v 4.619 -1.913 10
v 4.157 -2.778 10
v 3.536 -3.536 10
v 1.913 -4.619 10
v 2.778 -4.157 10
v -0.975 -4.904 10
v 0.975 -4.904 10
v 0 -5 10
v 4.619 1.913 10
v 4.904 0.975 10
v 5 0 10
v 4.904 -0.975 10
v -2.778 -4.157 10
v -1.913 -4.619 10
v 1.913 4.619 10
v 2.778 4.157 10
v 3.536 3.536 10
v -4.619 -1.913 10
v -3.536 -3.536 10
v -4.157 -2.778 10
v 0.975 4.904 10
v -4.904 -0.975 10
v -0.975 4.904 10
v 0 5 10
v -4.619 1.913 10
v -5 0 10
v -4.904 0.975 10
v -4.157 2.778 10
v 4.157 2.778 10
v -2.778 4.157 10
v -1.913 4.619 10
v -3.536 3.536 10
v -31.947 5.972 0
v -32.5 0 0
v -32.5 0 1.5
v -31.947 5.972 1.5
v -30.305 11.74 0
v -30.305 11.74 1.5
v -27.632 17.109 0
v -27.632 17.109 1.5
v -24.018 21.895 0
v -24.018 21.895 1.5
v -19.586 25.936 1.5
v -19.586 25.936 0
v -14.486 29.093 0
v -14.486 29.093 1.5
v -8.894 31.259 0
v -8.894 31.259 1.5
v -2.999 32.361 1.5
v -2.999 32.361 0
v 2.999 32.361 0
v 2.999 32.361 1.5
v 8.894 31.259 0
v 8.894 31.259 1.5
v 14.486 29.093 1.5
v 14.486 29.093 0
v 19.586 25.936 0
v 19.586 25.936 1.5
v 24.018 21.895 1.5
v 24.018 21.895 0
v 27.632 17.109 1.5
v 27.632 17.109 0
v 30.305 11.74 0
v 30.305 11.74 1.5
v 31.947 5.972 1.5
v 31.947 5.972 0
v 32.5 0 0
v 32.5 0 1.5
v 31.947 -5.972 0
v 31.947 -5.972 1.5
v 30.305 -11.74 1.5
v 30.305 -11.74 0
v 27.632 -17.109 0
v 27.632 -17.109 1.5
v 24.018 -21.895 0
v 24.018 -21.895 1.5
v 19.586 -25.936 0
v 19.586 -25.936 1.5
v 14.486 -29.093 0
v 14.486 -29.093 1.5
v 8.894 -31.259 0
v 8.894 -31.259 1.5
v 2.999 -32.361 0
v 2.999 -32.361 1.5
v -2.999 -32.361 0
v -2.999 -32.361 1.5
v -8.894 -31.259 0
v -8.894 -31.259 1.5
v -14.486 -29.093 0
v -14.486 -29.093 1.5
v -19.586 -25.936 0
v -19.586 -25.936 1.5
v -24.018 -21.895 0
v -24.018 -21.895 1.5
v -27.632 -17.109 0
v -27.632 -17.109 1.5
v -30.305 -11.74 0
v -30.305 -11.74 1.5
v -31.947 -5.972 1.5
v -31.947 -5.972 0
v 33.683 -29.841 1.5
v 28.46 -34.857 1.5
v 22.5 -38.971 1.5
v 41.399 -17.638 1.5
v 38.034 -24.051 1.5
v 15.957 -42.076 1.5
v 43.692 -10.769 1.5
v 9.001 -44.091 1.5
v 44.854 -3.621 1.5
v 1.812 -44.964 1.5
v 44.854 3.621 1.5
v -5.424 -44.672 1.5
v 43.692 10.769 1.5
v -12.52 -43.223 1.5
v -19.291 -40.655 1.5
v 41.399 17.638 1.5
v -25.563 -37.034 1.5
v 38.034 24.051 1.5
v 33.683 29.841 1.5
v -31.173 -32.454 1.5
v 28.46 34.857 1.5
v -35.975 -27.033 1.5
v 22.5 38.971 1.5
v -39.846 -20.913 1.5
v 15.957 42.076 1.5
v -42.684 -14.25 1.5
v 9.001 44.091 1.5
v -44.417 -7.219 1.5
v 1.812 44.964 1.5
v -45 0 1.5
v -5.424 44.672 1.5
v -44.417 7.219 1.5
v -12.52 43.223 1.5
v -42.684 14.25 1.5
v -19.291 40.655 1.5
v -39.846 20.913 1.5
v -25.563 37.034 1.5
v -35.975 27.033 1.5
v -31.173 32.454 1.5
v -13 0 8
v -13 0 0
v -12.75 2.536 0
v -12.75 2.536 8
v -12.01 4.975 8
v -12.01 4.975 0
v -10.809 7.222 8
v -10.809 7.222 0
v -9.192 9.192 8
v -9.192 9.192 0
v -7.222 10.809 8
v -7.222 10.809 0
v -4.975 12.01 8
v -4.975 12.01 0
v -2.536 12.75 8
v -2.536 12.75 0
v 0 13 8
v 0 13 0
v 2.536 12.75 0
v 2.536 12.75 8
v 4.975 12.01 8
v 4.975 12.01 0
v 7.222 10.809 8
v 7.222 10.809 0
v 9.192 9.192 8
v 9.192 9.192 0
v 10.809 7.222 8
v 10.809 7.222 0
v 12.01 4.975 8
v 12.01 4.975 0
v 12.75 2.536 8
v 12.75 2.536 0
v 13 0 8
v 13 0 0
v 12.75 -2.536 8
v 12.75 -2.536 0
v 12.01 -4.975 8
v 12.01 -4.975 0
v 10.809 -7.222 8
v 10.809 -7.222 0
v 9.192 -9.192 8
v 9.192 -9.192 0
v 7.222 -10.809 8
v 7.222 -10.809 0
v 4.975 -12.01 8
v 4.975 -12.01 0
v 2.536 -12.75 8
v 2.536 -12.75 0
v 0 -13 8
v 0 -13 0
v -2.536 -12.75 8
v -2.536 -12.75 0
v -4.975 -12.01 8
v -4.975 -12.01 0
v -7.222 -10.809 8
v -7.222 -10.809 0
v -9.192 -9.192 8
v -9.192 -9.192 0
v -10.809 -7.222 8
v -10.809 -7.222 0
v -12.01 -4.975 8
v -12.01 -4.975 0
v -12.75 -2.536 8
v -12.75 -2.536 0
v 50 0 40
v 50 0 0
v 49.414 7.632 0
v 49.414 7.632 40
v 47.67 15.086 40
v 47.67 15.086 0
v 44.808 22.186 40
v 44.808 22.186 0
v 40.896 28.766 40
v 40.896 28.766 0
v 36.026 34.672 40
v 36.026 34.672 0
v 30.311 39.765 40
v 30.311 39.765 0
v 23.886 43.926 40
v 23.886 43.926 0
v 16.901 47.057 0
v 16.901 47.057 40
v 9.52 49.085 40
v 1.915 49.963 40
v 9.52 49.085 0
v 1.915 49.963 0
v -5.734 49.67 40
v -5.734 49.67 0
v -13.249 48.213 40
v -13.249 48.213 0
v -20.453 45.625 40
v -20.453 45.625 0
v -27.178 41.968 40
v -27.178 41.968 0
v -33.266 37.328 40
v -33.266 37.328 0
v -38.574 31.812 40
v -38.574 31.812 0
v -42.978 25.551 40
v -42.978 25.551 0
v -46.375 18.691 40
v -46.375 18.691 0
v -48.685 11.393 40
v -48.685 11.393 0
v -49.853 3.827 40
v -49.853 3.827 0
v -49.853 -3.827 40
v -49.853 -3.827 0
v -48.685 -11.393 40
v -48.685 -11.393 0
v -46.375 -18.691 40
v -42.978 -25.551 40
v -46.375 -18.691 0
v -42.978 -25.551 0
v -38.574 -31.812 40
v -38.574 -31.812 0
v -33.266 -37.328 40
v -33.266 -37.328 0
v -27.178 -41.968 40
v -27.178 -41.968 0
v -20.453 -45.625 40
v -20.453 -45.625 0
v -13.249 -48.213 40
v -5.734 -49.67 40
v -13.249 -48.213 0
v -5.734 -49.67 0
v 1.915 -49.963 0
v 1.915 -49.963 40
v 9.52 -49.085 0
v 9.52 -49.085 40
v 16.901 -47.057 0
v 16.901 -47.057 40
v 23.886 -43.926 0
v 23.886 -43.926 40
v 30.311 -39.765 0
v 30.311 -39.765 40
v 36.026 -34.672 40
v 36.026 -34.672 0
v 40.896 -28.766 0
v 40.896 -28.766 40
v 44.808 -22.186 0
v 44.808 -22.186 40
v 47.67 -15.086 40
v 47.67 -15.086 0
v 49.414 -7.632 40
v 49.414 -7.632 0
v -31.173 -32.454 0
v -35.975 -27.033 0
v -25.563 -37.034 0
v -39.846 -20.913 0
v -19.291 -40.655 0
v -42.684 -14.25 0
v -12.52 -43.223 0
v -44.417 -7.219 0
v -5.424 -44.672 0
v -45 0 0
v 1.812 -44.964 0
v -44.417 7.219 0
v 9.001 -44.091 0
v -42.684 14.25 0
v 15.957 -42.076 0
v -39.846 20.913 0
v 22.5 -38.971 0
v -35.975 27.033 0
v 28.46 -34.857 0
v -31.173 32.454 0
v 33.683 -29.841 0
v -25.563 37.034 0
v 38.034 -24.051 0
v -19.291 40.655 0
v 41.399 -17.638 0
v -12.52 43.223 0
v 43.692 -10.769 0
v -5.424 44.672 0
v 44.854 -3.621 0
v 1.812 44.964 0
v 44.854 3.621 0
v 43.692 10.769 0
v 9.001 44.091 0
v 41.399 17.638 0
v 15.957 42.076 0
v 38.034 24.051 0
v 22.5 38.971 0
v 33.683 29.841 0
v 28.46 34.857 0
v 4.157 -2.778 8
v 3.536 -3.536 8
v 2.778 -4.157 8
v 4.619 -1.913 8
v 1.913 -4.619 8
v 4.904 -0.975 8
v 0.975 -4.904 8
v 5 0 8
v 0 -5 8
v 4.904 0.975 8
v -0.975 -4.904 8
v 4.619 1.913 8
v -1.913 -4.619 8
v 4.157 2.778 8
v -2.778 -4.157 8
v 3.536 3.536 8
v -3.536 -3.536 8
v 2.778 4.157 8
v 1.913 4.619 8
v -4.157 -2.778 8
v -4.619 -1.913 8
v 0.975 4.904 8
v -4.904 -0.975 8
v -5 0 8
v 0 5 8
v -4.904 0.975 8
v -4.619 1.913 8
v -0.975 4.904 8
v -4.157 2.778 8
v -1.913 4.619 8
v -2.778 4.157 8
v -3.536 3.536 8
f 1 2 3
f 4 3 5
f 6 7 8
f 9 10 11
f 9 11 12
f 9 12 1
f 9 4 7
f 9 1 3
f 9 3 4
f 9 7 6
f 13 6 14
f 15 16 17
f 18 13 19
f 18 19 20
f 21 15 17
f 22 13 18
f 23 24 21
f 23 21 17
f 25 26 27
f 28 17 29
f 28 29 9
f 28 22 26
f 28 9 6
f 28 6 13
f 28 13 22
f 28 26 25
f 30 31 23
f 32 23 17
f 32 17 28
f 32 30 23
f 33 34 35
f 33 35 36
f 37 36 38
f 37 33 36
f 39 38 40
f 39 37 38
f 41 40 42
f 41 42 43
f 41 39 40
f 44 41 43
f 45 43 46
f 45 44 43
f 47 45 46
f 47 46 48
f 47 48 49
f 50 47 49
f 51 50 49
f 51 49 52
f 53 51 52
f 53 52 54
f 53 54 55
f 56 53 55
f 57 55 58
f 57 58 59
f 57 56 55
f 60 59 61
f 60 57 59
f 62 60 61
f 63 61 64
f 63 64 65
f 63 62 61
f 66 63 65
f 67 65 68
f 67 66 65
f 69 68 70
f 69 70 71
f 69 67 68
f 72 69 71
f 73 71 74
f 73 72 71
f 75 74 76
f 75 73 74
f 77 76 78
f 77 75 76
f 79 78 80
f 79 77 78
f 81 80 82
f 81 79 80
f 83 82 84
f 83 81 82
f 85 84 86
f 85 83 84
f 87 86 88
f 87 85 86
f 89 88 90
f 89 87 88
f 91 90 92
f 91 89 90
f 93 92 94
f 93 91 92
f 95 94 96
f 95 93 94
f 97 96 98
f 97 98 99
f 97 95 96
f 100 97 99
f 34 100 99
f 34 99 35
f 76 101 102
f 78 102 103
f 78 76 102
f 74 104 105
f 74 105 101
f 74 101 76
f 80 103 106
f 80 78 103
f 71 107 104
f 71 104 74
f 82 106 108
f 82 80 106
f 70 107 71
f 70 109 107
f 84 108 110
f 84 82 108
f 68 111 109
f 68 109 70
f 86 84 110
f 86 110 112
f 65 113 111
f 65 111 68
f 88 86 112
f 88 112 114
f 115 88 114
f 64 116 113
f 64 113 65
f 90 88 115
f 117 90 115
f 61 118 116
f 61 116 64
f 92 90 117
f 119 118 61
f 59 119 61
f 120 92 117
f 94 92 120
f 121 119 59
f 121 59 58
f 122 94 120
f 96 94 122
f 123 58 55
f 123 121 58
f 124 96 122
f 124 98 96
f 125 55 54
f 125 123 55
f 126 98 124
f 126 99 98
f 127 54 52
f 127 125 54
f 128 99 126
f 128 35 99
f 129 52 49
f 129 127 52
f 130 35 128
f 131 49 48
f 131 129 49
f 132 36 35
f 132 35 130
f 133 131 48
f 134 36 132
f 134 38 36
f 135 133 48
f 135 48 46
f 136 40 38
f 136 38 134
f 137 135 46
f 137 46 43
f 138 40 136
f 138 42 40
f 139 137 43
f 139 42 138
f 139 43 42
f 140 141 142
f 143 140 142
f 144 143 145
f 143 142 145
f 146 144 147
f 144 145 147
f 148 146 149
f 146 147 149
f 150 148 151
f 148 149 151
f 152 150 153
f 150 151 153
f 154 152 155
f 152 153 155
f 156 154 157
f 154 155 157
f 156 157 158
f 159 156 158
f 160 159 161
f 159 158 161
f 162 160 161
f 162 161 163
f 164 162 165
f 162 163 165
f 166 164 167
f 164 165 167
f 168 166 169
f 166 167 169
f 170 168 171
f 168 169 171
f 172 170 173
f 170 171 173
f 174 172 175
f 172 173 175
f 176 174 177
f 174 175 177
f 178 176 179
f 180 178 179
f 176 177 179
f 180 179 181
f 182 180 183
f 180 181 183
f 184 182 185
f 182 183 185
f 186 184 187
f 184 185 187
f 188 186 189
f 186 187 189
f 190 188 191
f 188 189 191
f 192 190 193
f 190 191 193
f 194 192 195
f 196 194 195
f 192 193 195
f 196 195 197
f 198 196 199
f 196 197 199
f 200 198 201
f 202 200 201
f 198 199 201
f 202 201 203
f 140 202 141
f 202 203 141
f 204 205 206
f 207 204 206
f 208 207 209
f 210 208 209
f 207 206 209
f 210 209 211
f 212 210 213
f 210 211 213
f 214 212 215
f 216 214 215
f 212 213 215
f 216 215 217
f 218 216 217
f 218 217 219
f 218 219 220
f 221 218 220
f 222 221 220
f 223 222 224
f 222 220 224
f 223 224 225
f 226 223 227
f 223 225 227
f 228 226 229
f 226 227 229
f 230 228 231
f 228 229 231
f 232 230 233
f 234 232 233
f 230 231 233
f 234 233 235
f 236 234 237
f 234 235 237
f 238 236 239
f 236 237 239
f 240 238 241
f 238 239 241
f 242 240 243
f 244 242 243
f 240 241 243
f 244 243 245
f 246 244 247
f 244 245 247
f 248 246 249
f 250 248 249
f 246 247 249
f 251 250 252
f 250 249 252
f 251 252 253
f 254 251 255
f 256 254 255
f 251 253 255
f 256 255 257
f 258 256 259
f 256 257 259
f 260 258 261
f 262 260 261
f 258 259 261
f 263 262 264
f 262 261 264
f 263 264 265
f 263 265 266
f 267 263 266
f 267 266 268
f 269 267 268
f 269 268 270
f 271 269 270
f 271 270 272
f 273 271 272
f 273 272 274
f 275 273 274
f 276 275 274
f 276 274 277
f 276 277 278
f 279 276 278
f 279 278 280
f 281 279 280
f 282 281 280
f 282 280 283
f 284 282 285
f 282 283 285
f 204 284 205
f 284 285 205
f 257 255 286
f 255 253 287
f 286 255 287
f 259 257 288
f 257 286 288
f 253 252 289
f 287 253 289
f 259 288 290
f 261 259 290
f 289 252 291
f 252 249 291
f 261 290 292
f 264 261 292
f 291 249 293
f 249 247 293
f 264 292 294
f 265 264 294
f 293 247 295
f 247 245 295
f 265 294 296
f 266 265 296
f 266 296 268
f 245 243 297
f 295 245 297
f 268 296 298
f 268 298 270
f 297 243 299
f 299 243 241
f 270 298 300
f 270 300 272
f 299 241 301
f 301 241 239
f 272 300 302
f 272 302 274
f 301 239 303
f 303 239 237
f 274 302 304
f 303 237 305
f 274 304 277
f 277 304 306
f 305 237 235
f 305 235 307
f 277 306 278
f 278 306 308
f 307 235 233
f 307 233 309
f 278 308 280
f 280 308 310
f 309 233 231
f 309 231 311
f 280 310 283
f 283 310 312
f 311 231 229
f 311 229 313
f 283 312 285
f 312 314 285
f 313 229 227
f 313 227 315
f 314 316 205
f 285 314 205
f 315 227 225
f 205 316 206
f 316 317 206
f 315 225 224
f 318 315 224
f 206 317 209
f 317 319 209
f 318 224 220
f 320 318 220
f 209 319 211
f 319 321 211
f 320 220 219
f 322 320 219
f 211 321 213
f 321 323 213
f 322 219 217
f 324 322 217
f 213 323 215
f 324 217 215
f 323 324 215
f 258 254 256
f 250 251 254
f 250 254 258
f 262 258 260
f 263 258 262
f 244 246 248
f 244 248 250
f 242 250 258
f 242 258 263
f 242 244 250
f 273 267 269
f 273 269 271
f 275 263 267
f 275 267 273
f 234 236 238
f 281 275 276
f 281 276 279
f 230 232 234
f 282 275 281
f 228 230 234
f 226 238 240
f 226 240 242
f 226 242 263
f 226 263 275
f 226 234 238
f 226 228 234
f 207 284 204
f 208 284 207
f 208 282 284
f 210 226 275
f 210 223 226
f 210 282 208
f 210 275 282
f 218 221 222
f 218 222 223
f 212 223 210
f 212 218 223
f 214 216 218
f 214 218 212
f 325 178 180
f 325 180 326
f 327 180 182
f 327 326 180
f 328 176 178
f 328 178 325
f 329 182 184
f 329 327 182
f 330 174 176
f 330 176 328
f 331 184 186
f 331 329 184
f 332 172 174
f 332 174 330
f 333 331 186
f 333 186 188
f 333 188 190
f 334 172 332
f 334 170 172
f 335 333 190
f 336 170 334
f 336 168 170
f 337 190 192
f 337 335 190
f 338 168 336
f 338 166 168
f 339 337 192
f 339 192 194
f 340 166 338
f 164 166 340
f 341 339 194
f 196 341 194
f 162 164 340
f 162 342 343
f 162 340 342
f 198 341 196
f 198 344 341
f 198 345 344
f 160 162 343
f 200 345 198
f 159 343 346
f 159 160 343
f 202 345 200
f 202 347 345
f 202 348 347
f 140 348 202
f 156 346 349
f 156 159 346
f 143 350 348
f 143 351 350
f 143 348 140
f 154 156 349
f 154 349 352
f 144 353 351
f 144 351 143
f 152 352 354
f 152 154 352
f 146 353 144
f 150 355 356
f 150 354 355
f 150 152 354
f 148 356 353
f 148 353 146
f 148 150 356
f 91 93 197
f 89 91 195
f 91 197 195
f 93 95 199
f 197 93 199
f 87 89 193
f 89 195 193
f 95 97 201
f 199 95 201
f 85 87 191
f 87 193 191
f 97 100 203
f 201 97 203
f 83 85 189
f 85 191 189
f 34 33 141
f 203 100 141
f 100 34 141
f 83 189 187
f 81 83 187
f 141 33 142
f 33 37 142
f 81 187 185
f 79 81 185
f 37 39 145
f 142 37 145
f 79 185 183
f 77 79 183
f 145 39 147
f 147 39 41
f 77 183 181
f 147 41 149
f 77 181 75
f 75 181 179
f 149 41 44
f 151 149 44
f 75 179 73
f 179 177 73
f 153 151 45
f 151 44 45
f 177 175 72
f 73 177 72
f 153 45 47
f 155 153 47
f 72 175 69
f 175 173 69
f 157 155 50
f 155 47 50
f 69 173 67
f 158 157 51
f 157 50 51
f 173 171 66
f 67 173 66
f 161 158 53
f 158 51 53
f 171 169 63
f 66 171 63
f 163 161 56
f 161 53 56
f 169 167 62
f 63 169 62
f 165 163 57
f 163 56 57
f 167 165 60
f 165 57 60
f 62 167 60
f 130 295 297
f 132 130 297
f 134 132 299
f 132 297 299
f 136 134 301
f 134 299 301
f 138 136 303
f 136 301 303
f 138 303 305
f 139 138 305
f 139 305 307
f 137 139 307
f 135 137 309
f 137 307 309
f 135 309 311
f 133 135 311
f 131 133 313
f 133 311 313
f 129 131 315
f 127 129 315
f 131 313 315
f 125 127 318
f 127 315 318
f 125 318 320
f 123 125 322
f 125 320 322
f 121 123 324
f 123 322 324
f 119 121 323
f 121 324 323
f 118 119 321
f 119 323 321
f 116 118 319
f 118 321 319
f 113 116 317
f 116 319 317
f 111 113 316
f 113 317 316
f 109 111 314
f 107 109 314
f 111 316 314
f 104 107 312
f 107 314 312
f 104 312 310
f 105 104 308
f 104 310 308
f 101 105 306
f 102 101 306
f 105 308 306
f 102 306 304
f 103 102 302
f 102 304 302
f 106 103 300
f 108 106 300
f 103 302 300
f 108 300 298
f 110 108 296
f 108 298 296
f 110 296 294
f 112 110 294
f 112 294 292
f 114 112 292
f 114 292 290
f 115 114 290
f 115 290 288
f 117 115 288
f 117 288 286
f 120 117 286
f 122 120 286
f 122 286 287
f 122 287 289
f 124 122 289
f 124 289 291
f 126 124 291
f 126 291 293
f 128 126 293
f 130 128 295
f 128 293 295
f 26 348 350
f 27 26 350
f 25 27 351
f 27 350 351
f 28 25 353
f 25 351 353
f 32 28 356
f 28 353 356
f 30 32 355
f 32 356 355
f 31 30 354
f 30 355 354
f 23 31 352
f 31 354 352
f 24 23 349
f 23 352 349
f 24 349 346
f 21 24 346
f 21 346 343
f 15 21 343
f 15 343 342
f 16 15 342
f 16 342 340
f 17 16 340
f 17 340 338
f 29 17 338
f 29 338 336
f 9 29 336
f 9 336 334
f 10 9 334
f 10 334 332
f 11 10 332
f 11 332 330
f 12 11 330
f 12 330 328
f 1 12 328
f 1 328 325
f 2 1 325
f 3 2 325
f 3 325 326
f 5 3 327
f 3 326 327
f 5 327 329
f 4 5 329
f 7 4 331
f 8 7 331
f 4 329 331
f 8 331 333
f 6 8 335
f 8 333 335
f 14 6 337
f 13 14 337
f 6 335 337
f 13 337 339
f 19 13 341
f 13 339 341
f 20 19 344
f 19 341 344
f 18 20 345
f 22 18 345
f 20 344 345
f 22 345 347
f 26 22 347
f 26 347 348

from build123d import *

# Parameters (mm, degrees)
CROQUIS1_R              = 50
SALIENTE_EXTRUIR1_DEPTH = 40
CROQUIS2_R              = 45
CROQUIS2_R_2            = 32.5
CORTAR_EXTRUIR1_DEPTH   = 1.5
CROQUIS3_R              = 13
CROQUIS3_R_2            = 5
CORTAR_EXTRUIR2_DEPTH   = 8
CROQUIS4_R              = 5
CORTAR_EXTRUIR3_DEPTH   = 10


with BuildPart() as part:
    # Croquis1 → Saliente-Extruir1 (new body)
    with BuildSketch(Plane.XY):
        Circle(CROQUIS1_R)
    extrude(amount=SALIENTE_EXTRUIR1_DEPTH)

    # Croquis2 → Cortar-Extruir1 (cut)
    with BuildSketch(Plane(origin=(0, 0, 0), x_dir=(-1, 0, 0), z_dir=(0, 0, -1))):
        Circle(CROQUIS2_R)
        Circle(CROQUIS2_R_2, mode=Mode.SUBTRACT)
    extrude(amount=-CORTAR_EXTRUIR1_DEPTH, mode=Mode.SUBTRACT)

    # Croquis3 → Cortar-Extruir2 (cut)
    with BuildSketch(Plane(origin=(0, 0, 0), x_dir=(-1, 0, 0), z_dir=(0, 0, -1))):
        Circle(CROQUIS3_R)
        Circle(CROQUIS3_R_2, mode=Mode.SUBTRACT)
    extrude(amount=-CORTAR_EXTRUIR2_DEPTH, mode=Mode.SUBTRACT)

    # Croquis4 → Cortar-Extruir3 (cut)
    with BuildSketch(Plane(origin=(0, 0, 0), x_dir=(-1, 0, 0), z_dir=(0, 0, -1))):
        Circle(CROQUIS4_R)
    extrude(amount=-CORTAR_EXTRUIR3_DEPTH, mode=Mode.SUBTRACT)


solid = part.part
